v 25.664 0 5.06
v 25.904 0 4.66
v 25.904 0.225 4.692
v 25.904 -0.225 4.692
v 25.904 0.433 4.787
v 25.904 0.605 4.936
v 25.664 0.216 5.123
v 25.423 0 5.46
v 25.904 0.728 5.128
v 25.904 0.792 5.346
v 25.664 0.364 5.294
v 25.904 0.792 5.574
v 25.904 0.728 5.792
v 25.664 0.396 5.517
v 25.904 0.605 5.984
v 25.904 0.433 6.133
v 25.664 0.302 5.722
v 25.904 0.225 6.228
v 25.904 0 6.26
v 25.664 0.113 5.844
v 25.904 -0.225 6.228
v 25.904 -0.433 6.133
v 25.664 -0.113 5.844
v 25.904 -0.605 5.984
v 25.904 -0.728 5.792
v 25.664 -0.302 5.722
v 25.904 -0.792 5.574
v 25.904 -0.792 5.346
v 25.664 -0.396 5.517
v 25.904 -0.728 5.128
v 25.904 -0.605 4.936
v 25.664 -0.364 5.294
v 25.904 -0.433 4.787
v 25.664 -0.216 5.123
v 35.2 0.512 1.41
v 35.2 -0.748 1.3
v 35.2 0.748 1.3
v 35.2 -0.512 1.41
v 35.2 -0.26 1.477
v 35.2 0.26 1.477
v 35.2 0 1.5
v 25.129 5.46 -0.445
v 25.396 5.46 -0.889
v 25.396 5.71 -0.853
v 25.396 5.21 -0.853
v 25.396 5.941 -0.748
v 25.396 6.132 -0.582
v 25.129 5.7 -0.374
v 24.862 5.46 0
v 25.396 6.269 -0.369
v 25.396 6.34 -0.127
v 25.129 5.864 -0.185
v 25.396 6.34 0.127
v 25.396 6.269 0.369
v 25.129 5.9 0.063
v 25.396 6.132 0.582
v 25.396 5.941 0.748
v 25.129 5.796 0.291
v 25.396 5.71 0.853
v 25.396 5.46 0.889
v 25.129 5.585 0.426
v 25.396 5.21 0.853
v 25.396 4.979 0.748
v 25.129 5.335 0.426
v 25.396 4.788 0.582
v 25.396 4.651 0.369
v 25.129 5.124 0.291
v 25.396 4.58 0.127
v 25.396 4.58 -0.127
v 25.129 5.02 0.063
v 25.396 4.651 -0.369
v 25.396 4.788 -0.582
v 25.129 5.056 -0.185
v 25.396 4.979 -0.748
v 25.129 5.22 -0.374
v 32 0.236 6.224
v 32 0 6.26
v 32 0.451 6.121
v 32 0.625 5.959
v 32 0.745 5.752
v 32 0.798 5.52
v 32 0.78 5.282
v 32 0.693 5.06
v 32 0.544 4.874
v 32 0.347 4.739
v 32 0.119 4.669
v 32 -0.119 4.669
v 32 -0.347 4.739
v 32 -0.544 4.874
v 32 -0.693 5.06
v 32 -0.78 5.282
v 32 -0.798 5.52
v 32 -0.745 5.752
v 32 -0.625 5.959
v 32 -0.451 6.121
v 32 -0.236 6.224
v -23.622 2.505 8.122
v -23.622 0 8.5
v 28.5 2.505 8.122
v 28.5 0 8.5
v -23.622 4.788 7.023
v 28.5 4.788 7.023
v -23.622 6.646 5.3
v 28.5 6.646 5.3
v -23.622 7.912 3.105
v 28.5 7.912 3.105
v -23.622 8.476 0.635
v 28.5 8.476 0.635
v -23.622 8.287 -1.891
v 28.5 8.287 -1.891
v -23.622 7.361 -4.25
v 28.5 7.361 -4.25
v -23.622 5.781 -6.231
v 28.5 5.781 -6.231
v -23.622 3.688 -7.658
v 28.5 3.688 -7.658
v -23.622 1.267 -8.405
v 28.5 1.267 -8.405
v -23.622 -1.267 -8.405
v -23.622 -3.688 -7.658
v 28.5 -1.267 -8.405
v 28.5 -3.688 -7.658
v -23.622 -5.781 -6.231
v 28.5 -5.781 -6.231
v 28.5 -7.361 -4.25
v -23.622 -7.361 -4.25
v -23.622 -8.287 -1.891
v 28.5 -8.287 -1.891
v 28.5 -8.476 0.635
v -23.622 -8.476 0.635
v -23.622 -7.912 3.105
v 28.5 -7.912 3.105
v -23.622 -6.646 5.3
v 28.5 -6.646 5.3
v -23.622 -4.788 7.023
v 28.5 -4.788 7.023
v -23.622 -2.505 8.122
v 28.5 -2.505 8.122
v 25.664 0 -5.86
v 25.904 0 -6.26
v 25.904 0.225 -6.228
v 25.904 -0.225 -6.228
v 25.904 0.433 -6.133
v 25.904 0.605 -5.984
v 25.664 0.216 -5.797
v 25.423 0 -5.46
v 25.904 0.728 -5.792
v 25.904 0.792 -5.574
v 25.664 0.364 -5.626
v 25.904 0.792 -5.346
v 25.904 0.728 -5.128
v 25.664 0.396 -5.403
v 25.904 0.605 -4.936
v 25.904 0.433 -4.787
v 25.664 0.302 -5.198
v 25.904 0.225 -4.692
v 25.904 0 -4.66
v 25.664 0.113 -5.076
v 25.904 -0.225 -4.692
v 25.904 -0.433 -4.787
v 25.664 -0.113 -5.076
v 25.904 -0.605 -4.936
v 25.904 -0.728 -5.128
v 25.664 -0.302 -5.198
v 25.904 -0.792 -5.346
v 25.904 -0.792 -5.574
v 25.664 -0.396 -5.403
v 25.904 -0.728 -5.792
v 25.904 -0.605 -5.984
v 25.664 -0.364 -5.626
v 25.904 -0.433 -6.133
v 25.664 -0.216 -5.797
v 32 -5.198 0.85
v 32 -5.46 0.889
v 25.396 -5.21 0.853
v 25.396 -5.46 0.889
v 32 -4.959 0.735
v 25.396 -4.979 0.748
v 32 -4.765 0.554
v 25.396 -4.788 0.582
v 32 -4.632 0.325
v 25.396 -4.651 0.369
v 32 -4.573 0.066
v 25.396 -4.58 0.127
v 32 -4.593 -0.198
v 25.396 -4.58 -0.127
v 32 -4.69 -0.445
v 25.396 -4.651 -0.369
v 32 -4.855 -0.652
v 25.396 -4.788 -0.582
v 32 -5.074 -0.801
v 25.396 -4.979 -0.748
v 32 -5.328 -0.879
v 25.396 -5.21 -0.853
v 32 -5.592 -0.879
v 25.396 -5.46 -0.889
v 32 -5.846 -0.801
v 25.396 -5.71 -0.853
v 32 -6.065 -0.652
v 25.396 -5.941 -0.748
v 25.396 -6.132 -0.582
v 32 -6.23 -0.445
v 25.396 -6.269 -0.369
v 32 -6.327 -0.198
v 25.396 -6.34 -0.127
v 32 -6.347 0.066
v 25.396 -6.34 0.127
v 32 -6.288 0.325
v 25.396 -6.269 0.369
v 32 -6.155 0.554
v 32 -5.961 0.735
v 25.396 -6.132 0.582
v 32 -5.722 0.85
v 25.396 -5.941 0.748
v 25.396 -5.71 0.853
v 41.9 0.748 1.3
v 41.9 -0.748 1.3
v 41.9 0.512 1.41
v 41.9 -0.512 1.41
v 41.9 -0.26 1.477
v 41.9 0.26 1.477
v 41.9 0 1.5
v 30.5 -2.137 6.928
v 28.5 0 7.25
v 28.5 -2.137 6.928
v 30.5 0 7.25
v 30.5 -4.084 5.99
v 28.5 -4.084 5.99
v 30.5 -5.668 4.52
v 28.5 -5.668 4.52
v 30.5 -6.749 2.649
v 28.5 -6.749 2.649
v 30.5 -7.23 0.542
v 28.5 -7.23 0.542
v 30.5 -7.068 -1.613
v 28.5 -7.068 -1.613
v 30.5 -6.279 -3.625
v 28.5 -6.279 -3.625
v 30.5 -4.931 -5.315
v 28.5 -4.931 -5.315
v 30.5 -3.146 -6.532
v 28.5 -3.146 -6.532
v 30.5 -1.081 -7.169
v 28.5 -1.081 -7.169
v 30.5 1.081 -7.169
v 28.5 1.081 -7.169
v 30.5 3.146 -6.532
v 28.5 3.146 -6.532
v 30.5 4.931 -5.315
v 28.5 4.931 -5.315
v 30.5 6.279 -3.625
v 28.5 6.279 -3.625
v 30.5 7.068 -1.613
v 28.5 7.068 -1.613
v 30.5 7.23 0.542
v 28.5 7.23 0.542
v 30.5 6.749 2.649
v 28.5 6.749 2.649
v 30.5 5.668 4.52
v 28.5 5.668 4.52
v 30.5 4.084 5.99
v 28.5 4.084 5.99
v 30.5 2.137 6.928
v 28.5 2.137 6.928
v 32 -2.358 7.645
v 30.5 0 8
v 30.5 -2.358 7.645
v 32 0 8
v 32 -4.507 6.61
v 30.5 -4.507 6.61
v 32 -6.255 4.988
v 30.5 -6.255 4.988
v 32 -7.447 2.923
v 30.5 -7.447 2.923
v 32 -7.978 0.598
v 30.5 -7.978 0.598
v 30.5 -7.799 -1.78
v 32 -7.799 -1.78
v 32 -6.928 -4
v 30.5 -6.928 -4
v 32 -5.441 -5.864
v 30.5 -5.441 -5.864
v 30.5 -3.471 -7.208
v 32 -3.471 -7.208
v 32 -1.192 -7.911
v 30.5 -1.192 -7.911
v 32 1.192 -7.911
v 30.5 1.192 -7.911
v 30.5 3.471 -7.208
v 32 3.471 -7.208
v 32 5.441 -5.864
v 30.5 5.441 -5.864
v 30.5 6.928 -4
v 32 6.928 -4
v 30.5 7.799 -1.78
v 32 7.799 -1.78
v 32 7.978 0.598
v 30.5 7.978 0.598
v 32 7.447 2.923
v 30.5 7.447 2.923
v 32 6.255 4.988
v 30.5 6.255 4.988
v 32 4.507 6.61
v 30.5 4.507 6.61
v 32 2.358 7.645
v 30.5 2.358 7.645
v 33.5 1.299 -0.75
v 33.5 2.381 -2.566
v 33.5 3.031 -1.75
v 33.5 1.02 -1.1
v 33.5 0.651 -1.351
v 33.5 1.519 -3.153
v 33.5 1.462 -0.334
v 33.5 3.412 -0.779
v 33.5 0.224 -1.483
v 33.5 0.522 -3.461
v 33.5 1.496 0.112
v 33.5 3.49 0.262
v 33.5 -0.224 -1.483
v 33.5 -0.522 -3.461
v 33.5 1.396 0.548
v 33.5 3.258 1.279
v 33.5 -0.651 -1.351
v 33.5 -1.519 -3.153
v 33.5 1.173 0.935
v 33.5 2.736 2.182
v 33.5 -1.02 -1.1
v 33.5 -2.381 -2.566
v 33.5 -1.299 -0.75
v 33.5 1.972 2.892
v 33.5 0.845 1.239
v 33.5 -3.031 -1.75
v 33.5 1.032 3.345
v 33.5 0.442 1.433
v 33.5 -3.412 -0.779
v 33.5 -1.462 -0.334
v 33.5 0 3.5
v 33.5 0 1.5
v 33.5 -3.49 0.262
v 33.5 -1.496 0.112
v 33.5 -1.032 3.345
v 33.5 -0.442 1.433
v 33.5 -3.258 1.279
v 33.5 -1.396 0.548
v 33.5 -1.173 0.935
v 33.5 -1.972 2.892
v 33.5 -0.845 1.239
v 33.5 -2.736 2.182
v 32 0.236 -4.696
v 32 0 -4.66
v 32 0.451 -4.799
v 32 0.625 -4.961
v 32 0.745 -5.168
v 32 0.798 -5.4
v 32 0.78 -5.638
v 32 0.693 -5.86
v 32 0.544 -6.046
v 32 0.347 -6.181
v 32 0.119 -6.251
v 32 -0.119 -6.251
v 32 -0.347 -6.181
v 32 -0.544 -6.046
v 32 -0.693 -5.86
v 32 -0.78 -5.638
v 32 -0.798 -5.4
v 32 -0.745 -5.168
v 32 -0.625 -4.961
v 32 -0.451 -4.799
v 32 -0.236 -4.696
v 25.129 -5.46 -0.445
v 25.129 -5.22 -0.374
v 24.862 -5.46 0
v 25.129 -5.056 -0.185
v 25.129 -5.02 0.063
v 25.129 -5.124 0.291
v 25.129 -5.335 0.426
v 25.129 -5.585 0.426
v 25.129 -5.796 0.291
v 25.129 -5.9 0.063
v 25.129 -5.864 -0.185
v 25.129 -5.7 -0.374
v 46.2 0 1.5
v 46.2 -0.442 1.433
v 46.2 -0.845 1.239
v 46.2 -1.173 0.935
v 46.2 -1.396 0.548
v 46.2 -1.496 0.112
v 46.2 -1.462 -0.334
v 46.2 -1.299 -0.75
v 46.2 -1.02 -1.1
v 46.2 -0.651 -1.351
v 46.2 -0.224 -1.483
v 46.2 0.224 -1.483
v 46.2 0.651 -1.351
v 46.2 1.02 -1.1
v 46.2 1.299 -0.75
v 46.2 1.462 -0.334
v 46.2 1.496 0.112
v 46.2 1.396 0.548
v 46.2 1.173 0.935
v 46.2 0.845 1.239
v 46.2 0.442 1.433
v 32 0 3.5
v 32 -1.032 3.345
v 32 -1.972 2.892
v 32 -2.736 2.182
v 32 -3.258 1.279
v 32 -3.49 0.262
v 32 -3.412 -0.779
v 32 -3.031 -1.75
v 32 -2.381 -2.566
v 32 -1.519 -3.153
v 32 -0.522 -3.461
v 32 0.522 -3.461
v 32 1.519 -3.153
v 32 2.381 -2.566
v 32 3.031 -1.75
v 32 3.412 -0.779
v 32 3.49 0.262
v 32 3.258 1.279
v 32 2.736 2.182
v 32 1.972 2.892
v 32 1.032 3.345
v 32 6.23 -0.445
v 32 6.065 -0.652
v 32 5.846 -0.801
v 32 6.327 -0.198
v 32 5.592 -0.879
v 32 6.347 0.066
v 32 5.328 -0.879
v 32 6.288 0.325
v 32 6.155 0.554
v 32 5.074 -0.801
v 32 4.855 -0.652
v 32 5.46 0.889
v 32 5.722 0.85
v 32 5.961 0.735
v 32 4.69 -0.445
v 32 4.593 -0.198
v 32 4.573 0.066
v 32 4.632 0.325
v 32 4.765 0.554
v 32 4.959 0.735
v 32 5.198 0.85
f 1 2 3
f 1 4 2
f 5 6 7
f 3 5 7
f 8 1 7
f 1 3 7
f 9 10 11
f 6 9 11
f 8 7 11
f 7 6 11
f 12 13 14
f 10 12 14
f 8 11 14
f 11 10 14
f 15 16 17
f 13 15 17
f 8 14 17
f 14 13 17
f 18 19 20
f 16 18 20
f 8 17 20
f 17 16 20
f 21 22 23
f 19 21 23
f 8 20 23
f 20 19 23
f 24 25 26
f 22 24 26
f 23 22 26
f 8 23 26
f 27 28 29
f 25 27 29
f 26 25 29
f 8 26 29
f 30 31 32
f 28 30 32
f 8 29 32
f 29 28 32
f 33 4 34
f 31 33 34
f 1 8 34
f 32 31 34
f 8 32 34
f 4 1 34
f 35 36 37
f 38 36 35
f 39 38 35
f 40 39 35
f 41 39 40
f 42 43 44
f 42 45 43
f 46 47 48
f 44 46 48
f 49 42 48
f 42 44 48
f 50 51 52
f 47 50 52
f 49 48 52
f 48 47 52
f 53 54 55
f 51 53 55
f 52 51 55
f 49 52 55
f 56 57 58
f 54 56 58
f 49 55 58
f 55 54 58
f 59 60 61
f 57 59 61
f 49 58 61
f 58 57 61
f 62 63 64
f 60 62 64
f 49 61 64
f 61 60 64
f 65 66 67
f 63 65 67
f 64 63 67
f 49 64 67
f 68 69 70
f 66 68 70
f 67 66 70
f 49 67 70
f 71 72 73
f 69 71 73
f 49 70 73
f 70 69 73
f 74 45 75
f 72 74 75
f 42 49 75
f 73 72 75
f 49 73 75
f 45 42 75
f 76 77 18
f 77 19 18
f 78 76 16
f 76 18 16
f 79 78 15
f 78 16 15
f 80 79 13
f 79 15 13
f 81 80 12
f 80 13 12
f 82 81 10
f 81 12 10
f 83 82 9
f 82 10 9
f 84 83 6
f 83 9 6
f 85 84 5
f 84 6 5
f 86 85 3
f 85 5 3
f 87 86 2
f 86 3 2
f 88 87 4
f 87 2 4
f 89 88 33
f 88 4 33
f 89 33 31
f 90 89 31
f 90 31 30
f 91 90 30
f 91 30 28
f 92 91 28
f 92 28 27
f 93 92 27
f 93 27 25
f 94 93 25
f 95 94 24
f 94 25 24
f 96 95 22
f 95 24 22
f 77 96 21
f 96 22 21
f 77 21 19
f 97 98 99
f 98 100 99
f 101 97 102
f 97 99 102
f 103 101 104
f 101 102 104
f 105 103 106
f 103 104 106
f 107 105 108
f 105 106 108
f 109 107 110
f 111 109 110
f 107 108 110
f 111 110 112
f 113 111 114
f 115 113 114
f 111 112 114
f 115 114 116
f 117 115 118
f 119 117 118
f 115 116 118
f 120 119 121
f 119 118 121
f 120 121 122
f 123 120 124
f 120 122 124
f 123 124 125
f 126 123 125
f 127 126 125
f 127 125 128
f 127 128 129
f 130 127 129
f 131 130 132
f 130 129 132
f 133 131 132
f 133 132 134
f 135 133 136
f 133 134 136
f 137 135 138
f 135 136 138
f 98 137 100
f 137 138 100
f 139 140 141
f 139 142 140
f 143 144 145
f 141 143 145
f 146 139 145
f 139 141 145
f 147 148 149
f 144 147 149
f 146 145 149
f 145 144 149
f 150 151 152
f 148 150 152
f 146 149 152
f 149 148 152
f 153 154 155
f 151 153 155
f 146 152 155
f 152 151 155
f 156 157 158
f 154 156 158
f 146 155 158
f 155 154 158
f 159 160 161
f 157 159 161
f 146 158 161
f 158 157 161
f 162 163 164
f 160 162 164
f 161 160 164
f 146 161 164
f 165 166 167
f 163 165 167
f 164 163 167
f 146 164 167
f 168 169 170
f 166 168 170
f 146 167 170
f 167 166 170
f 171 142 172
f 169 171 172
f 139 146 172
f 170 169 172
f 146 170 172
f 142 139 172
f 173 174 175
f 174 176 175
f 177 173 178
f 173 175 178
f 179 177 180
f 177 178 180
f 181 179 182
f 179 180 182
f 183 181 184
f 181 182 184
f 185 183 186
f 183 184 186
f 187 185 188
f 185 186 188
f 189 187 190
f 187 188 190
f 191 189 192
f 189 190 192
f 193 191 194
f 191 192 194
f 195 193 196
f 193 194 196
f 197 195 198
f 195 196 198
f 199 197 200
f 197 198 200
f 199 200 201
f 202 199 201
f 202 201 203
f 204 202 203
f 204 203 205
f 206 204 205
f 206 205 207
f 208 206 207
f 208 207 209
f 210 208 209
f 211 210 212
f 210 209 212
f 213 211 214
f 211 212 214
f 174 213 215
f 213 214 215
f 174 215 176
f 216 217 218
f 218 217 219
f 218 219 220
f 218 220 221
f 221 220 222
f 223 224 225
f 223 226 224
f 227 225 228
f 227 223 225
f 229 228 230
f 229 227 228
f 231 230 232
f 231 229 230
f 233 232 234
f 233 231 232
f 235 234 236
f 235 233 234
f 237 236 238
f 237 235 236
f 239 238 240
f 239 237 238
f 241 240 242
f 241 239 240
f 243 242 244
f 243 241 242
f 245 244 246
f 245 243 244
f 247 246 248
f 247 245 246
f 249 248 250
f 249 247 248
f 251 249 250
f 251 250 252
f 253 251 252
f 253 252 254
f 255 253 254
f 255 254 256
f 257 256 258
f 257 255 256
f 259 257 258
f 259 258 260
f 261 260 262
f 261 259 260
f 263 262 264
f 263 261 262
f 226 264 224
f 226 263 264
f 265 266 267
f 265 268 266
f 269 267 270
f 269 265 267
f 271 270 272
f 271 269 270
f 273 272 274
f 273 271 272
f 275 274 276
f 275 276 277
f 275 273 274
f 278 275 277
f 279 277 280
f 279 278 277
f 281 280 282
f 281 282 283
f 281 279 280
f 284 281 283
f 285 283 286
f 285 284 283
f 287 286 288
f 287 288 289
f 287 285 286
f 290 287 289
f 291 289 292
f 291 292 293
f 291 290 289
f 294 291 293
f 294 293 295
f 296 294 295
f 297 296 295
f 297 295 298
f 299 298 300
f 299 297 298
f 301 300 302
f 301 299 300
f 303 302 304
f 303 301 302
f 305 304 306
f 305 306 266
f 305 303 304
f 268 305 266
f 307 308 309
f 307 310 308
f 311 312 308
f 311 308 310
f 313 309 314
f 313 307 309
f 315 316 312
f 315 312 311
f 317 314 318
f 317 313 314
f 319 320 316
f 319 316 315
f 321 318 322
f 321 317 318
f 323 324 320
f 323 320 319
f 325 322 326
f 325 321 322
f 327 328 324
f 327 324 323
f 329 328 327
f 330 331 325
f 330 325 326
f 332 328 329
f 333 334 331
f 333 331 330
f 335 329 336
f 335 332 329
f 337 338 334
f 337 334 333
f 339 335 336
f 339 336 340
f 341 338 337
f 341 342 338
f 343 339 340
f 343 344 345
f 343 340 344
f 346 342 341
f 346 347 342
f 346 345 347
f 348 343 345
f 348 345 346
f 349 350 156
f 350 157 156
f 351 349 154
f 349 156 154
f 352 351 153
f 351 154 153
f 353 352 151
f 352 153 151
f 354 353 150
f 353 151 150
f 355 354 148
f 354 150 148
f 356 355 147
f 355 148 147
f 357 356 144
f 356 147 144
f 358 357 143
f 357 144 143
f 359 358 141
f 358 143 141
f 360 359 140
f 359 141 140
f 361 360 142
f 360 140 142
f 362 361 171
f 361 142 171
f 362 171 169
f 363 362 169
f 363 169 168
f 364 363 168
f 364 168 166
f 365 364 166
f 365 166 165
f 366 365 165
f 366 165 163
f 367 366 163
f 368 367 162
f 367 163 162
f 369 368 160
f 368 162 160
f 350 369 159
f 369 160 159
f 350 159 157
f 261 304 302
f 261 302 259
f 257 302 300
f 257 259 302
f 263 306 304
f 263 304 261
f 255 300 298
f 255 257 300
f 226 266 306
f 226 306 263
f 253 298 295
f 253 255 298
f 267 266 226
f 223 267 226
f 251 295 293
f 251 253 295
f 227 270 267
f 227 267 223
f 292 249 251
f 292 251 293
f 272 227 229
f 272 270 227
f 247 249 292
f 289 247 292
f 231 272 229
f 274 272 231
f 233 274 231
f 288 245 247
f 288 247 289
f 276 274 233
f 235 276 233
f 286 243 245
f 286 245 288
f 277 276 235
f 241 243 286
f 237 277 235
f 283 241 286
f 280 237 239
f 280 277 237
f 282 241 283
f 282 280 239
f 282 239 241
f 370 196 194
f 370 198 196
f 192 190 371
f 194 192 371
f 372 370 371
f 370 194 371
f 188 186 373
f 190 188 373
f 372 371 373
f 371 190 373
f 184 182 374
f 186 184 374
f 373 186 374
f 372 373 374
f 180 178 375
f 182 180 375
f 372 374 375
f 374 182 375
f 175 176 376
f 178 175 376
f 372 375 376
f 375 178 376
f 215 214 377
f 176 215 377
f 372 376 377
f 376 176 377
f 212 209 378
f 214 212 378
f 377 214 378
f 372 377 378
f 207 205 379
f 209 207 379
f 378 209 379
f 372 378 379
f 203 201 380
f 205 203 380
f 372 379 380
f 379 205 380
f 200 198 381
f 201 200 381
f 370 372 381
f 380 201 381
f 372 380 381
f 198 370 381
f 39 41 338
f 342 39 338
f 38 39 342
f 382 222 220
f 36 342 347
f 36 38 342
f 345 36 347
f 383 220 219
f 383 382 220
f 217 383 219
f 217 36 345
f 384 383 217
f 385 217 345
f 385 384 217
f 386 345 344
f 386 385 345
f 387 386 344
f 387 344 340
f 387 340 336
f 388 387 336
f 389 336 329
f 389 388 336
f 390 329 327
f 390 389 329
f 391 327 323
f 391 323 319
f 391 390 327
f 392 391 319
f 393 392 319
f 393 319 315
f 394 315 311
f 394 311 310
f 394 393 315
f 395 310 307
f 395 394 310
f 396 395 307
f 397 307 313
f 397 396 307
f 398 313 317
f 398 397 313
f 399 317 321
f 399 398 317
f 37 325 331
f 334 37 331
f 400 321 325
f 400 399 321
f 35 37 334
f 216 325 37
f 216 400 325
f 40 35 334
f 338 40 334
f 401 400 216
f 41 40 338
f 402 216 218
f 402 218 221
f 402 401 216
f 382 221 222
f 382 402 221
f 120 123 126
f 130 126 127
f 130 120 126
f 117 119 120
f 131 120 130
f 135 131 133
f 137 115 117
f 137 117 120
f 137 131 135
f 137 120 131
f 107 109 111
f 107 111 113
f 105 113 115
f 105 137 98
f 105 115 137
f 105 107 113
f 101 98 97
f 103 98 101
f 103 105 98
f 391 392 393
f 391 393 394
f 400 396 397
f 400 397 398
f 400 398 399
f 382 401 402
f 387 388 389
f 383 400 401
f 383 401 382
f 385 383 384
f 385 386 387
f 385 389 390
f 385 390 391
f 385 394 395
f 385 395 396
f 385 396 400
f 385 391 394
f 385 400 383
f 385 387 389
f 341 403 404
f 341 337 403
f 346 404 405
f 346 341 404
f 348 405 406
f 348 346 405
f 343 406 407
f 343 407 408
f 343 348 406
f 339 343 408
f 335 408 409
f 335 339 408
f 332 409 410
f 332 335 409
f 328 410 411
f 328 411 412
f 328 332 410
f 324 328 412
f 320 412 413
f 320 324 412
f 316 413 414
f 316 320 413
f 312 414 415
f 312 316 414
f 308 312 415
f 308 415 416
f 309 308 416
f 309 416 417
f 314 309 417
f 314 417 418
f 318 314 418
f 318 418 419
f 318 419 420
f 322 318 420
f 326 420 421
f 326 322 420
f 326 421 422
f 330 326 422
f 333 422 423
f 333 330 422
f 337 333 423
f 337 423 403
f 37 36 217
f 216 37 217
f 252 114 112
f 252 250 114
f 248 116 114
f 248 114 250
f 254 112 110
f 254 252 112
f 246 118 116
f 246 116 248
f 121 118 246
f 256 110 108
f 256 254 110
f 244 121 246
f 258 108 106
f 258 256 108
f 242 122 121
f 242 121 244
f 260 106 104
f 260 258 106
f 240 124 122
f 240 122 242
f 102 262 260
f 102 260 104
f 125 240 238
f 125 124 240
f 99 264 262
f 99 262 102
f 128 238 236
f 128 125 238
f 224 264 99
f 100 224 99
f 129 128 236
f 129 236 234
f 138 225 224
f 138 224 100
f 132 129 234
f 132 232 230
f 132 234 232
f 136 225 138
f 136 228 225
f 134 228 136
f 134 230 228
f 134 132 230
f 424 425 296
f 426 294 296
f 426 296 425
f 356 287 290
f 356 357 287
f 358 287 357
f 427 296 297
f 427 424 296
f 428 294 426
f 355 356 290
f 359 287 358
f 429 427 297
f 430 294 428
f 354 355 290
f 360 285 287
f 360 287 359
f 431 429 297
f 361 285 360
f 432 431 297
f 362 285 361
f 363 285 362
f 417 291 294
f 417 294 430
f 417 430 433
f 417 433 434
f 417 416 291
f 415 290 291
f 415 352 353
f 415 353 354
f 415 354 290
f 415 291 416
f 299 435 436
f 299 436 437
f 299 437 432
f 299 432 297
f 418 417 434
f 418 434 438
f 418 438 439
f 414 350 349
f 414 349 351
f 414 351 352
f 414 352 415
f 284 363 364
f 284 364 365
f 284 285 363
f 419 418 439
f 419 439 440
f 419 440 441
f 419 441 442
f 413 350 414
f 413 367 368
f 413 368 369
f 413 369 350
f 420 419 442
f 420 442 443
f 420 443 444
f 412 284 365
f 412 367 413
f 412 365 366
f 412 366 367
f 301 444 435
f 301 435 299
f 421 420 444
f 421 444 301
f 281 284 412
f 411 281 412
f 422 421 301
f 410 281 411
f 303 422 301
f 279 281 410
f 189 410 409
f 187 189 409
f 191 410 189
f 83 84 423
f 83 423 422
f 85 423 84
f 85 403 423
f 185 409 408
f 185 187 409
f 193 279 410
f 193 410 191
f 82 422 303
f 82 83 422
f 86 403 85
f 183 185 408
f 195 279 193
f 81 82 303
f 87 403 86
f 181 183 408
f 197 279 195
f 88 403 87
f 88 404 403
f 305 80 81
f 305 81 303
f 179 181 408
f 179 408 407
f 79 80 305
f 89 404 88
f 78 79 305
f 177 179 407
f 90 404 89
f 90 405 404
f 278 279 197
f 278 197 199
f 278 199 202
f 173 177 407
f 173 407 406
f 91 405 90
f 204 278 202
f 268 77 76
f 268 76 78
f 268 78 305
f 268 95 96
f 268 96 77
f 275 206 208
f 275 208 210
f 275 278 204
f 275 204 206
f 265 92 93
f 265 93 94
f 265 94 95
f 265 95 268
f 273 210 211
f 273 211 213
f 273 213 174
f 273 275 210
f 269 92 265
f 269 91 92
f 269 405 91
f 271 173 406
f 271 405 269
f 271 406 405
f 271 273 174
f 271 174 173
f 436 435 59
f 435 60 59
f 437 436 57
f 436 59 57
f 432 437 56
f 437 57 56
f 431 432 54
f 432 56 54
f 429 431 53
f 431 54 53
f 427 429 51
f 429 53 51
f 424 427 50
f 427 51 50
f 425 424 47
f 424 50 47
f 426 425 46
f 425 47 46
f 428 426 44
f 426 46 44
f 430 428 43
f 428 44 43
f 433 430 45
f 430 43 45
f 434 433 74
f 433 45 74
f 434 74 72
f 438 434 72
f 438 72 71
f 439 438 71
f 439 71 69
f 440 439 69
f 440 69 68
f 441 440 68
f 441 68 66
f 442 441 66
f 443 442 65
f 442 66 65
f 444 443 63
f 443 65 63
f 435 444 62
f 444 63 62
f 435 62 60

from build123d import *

# Parameters (mm, degrees)
CUT_EXTRUDE1_DEPTH        = 2.54
CUT_EXTRUDE1_DEPTH_BACK   = 2.54
SKETCH4_W                 = 6.7
SKETCH4_H                 = 0.2
F_2_56_TAPPED_HOLE1_D     = 1.778
F_2_56_TAPPED_HOLE1_DEPTH = 6.604
F_2_56_TAPPED_HOLE1_TIP   = 0.53416509
M2X0_4_TAPPED_HOLE1_D     = 1.6
M2X0_4_TAPPED_HOLE1_DEPTH = 6.096
M2X0_4_TAPPED_HOLE1_TIP   = 0.480688495
SKETCH10_R                = 8.5
BOSS_EXTRUDE2_DEPTH       = 23.622


with BuildPart() as part:
    # Sketch3 → Revolve1 (revolve)
    with BuildSketch(Plane.XY):
        Polygon((0, -8.5), (28.5, -8.5), (28.5, -7.25), (30.5, -7.25), (30.5, -8), (32, -8), (32, -3.5), (33.5, -3.5), (33.5, -1.5), (40.888216755, -1.5), (41.661571645, -1.5), (46.2, -1.5), (46.2, 0), (0, 0), align=None)
    revolve(axis=Axis((0, 0, 0), (1, 0, 0)))

    # Sketch4 → Cut-Extrude1 (cut, two sides: drawn at the far end of the back side and taken through both)
    with BuildSketch(Plane(origin=(0, 0, 0), x_dir=(1, 0, 0), z_dir=(0, 1, 0)).offset(-CUT_EXTRUDE1_DEPTH_BACK)):
        with Locations((38.55, -1.4)):
            Rectangle(SKETCH4_W, SKETCH4_H)
    extrude(amount=CUT_EXTRUDE1_DEPTH + CUT_EXTRUDE1_DEPTH_BACK, mode=Mode.SUBTRACT)

    # #2-56 Tapped Hole1
    with Locations(Plane(origin=(32, 0, 0), x_dir=(0, 0, -1), z_dir=(1, 0, 0))):
        with Locations((0, 5.46), (0, -5.46)):
            Hole(F_2_56_TAPPED_HOLE1_D / 2, depth=F_2_56_TAPPED_HOLE1_DEPTH)
            with Locations((0, 0, -(F_2_56_TAPPED_HOLE1_DEPTH + F_2_56_TAPPED_HOLE1_TIP / 2))):  # 118° drill point
                Cone(0, F_2_56_TAPPED_HOLE1_D / 2, F_2_56_TAPPED_HOLE1_TIP, mode=Mode.SUBTRACT)

    # M2x0.4 Tapped Hole1
    with Locations(Plane(origin=(32, 0, 0), x_dir=(0, 0, -1), z_dir=(1, 0, 0))):
        with Locations((-5.46, 0), (5.46, 0)):
            Hole(M2X0_4_TAPPED_HOLE1_D / 2, depth=M2X0_4_TAPPED_HOLE1_DEPTH)
            with Locations((0, 0, -(M2X0_4_TAPPED_HOLE1_DEPTH + M2X0_4_TAPPED_HOLE1_TIP / 2))):  # 118° drill point
                Cone(0, M2X0_4_TAPPED_HOLE1_D / 2, M2X0_4_TAPPED_HOLE1_TIP, mode=Mode.SUBTRACT)

    # Sketch10 → Boss-Extrude2 (add)
    with BuildSketch(Plane.ZY):
        Circle(SKETCH10_R)
    extrude(amount=BOSS_EXTRUDE2_DEPTH)


solid = part.part
